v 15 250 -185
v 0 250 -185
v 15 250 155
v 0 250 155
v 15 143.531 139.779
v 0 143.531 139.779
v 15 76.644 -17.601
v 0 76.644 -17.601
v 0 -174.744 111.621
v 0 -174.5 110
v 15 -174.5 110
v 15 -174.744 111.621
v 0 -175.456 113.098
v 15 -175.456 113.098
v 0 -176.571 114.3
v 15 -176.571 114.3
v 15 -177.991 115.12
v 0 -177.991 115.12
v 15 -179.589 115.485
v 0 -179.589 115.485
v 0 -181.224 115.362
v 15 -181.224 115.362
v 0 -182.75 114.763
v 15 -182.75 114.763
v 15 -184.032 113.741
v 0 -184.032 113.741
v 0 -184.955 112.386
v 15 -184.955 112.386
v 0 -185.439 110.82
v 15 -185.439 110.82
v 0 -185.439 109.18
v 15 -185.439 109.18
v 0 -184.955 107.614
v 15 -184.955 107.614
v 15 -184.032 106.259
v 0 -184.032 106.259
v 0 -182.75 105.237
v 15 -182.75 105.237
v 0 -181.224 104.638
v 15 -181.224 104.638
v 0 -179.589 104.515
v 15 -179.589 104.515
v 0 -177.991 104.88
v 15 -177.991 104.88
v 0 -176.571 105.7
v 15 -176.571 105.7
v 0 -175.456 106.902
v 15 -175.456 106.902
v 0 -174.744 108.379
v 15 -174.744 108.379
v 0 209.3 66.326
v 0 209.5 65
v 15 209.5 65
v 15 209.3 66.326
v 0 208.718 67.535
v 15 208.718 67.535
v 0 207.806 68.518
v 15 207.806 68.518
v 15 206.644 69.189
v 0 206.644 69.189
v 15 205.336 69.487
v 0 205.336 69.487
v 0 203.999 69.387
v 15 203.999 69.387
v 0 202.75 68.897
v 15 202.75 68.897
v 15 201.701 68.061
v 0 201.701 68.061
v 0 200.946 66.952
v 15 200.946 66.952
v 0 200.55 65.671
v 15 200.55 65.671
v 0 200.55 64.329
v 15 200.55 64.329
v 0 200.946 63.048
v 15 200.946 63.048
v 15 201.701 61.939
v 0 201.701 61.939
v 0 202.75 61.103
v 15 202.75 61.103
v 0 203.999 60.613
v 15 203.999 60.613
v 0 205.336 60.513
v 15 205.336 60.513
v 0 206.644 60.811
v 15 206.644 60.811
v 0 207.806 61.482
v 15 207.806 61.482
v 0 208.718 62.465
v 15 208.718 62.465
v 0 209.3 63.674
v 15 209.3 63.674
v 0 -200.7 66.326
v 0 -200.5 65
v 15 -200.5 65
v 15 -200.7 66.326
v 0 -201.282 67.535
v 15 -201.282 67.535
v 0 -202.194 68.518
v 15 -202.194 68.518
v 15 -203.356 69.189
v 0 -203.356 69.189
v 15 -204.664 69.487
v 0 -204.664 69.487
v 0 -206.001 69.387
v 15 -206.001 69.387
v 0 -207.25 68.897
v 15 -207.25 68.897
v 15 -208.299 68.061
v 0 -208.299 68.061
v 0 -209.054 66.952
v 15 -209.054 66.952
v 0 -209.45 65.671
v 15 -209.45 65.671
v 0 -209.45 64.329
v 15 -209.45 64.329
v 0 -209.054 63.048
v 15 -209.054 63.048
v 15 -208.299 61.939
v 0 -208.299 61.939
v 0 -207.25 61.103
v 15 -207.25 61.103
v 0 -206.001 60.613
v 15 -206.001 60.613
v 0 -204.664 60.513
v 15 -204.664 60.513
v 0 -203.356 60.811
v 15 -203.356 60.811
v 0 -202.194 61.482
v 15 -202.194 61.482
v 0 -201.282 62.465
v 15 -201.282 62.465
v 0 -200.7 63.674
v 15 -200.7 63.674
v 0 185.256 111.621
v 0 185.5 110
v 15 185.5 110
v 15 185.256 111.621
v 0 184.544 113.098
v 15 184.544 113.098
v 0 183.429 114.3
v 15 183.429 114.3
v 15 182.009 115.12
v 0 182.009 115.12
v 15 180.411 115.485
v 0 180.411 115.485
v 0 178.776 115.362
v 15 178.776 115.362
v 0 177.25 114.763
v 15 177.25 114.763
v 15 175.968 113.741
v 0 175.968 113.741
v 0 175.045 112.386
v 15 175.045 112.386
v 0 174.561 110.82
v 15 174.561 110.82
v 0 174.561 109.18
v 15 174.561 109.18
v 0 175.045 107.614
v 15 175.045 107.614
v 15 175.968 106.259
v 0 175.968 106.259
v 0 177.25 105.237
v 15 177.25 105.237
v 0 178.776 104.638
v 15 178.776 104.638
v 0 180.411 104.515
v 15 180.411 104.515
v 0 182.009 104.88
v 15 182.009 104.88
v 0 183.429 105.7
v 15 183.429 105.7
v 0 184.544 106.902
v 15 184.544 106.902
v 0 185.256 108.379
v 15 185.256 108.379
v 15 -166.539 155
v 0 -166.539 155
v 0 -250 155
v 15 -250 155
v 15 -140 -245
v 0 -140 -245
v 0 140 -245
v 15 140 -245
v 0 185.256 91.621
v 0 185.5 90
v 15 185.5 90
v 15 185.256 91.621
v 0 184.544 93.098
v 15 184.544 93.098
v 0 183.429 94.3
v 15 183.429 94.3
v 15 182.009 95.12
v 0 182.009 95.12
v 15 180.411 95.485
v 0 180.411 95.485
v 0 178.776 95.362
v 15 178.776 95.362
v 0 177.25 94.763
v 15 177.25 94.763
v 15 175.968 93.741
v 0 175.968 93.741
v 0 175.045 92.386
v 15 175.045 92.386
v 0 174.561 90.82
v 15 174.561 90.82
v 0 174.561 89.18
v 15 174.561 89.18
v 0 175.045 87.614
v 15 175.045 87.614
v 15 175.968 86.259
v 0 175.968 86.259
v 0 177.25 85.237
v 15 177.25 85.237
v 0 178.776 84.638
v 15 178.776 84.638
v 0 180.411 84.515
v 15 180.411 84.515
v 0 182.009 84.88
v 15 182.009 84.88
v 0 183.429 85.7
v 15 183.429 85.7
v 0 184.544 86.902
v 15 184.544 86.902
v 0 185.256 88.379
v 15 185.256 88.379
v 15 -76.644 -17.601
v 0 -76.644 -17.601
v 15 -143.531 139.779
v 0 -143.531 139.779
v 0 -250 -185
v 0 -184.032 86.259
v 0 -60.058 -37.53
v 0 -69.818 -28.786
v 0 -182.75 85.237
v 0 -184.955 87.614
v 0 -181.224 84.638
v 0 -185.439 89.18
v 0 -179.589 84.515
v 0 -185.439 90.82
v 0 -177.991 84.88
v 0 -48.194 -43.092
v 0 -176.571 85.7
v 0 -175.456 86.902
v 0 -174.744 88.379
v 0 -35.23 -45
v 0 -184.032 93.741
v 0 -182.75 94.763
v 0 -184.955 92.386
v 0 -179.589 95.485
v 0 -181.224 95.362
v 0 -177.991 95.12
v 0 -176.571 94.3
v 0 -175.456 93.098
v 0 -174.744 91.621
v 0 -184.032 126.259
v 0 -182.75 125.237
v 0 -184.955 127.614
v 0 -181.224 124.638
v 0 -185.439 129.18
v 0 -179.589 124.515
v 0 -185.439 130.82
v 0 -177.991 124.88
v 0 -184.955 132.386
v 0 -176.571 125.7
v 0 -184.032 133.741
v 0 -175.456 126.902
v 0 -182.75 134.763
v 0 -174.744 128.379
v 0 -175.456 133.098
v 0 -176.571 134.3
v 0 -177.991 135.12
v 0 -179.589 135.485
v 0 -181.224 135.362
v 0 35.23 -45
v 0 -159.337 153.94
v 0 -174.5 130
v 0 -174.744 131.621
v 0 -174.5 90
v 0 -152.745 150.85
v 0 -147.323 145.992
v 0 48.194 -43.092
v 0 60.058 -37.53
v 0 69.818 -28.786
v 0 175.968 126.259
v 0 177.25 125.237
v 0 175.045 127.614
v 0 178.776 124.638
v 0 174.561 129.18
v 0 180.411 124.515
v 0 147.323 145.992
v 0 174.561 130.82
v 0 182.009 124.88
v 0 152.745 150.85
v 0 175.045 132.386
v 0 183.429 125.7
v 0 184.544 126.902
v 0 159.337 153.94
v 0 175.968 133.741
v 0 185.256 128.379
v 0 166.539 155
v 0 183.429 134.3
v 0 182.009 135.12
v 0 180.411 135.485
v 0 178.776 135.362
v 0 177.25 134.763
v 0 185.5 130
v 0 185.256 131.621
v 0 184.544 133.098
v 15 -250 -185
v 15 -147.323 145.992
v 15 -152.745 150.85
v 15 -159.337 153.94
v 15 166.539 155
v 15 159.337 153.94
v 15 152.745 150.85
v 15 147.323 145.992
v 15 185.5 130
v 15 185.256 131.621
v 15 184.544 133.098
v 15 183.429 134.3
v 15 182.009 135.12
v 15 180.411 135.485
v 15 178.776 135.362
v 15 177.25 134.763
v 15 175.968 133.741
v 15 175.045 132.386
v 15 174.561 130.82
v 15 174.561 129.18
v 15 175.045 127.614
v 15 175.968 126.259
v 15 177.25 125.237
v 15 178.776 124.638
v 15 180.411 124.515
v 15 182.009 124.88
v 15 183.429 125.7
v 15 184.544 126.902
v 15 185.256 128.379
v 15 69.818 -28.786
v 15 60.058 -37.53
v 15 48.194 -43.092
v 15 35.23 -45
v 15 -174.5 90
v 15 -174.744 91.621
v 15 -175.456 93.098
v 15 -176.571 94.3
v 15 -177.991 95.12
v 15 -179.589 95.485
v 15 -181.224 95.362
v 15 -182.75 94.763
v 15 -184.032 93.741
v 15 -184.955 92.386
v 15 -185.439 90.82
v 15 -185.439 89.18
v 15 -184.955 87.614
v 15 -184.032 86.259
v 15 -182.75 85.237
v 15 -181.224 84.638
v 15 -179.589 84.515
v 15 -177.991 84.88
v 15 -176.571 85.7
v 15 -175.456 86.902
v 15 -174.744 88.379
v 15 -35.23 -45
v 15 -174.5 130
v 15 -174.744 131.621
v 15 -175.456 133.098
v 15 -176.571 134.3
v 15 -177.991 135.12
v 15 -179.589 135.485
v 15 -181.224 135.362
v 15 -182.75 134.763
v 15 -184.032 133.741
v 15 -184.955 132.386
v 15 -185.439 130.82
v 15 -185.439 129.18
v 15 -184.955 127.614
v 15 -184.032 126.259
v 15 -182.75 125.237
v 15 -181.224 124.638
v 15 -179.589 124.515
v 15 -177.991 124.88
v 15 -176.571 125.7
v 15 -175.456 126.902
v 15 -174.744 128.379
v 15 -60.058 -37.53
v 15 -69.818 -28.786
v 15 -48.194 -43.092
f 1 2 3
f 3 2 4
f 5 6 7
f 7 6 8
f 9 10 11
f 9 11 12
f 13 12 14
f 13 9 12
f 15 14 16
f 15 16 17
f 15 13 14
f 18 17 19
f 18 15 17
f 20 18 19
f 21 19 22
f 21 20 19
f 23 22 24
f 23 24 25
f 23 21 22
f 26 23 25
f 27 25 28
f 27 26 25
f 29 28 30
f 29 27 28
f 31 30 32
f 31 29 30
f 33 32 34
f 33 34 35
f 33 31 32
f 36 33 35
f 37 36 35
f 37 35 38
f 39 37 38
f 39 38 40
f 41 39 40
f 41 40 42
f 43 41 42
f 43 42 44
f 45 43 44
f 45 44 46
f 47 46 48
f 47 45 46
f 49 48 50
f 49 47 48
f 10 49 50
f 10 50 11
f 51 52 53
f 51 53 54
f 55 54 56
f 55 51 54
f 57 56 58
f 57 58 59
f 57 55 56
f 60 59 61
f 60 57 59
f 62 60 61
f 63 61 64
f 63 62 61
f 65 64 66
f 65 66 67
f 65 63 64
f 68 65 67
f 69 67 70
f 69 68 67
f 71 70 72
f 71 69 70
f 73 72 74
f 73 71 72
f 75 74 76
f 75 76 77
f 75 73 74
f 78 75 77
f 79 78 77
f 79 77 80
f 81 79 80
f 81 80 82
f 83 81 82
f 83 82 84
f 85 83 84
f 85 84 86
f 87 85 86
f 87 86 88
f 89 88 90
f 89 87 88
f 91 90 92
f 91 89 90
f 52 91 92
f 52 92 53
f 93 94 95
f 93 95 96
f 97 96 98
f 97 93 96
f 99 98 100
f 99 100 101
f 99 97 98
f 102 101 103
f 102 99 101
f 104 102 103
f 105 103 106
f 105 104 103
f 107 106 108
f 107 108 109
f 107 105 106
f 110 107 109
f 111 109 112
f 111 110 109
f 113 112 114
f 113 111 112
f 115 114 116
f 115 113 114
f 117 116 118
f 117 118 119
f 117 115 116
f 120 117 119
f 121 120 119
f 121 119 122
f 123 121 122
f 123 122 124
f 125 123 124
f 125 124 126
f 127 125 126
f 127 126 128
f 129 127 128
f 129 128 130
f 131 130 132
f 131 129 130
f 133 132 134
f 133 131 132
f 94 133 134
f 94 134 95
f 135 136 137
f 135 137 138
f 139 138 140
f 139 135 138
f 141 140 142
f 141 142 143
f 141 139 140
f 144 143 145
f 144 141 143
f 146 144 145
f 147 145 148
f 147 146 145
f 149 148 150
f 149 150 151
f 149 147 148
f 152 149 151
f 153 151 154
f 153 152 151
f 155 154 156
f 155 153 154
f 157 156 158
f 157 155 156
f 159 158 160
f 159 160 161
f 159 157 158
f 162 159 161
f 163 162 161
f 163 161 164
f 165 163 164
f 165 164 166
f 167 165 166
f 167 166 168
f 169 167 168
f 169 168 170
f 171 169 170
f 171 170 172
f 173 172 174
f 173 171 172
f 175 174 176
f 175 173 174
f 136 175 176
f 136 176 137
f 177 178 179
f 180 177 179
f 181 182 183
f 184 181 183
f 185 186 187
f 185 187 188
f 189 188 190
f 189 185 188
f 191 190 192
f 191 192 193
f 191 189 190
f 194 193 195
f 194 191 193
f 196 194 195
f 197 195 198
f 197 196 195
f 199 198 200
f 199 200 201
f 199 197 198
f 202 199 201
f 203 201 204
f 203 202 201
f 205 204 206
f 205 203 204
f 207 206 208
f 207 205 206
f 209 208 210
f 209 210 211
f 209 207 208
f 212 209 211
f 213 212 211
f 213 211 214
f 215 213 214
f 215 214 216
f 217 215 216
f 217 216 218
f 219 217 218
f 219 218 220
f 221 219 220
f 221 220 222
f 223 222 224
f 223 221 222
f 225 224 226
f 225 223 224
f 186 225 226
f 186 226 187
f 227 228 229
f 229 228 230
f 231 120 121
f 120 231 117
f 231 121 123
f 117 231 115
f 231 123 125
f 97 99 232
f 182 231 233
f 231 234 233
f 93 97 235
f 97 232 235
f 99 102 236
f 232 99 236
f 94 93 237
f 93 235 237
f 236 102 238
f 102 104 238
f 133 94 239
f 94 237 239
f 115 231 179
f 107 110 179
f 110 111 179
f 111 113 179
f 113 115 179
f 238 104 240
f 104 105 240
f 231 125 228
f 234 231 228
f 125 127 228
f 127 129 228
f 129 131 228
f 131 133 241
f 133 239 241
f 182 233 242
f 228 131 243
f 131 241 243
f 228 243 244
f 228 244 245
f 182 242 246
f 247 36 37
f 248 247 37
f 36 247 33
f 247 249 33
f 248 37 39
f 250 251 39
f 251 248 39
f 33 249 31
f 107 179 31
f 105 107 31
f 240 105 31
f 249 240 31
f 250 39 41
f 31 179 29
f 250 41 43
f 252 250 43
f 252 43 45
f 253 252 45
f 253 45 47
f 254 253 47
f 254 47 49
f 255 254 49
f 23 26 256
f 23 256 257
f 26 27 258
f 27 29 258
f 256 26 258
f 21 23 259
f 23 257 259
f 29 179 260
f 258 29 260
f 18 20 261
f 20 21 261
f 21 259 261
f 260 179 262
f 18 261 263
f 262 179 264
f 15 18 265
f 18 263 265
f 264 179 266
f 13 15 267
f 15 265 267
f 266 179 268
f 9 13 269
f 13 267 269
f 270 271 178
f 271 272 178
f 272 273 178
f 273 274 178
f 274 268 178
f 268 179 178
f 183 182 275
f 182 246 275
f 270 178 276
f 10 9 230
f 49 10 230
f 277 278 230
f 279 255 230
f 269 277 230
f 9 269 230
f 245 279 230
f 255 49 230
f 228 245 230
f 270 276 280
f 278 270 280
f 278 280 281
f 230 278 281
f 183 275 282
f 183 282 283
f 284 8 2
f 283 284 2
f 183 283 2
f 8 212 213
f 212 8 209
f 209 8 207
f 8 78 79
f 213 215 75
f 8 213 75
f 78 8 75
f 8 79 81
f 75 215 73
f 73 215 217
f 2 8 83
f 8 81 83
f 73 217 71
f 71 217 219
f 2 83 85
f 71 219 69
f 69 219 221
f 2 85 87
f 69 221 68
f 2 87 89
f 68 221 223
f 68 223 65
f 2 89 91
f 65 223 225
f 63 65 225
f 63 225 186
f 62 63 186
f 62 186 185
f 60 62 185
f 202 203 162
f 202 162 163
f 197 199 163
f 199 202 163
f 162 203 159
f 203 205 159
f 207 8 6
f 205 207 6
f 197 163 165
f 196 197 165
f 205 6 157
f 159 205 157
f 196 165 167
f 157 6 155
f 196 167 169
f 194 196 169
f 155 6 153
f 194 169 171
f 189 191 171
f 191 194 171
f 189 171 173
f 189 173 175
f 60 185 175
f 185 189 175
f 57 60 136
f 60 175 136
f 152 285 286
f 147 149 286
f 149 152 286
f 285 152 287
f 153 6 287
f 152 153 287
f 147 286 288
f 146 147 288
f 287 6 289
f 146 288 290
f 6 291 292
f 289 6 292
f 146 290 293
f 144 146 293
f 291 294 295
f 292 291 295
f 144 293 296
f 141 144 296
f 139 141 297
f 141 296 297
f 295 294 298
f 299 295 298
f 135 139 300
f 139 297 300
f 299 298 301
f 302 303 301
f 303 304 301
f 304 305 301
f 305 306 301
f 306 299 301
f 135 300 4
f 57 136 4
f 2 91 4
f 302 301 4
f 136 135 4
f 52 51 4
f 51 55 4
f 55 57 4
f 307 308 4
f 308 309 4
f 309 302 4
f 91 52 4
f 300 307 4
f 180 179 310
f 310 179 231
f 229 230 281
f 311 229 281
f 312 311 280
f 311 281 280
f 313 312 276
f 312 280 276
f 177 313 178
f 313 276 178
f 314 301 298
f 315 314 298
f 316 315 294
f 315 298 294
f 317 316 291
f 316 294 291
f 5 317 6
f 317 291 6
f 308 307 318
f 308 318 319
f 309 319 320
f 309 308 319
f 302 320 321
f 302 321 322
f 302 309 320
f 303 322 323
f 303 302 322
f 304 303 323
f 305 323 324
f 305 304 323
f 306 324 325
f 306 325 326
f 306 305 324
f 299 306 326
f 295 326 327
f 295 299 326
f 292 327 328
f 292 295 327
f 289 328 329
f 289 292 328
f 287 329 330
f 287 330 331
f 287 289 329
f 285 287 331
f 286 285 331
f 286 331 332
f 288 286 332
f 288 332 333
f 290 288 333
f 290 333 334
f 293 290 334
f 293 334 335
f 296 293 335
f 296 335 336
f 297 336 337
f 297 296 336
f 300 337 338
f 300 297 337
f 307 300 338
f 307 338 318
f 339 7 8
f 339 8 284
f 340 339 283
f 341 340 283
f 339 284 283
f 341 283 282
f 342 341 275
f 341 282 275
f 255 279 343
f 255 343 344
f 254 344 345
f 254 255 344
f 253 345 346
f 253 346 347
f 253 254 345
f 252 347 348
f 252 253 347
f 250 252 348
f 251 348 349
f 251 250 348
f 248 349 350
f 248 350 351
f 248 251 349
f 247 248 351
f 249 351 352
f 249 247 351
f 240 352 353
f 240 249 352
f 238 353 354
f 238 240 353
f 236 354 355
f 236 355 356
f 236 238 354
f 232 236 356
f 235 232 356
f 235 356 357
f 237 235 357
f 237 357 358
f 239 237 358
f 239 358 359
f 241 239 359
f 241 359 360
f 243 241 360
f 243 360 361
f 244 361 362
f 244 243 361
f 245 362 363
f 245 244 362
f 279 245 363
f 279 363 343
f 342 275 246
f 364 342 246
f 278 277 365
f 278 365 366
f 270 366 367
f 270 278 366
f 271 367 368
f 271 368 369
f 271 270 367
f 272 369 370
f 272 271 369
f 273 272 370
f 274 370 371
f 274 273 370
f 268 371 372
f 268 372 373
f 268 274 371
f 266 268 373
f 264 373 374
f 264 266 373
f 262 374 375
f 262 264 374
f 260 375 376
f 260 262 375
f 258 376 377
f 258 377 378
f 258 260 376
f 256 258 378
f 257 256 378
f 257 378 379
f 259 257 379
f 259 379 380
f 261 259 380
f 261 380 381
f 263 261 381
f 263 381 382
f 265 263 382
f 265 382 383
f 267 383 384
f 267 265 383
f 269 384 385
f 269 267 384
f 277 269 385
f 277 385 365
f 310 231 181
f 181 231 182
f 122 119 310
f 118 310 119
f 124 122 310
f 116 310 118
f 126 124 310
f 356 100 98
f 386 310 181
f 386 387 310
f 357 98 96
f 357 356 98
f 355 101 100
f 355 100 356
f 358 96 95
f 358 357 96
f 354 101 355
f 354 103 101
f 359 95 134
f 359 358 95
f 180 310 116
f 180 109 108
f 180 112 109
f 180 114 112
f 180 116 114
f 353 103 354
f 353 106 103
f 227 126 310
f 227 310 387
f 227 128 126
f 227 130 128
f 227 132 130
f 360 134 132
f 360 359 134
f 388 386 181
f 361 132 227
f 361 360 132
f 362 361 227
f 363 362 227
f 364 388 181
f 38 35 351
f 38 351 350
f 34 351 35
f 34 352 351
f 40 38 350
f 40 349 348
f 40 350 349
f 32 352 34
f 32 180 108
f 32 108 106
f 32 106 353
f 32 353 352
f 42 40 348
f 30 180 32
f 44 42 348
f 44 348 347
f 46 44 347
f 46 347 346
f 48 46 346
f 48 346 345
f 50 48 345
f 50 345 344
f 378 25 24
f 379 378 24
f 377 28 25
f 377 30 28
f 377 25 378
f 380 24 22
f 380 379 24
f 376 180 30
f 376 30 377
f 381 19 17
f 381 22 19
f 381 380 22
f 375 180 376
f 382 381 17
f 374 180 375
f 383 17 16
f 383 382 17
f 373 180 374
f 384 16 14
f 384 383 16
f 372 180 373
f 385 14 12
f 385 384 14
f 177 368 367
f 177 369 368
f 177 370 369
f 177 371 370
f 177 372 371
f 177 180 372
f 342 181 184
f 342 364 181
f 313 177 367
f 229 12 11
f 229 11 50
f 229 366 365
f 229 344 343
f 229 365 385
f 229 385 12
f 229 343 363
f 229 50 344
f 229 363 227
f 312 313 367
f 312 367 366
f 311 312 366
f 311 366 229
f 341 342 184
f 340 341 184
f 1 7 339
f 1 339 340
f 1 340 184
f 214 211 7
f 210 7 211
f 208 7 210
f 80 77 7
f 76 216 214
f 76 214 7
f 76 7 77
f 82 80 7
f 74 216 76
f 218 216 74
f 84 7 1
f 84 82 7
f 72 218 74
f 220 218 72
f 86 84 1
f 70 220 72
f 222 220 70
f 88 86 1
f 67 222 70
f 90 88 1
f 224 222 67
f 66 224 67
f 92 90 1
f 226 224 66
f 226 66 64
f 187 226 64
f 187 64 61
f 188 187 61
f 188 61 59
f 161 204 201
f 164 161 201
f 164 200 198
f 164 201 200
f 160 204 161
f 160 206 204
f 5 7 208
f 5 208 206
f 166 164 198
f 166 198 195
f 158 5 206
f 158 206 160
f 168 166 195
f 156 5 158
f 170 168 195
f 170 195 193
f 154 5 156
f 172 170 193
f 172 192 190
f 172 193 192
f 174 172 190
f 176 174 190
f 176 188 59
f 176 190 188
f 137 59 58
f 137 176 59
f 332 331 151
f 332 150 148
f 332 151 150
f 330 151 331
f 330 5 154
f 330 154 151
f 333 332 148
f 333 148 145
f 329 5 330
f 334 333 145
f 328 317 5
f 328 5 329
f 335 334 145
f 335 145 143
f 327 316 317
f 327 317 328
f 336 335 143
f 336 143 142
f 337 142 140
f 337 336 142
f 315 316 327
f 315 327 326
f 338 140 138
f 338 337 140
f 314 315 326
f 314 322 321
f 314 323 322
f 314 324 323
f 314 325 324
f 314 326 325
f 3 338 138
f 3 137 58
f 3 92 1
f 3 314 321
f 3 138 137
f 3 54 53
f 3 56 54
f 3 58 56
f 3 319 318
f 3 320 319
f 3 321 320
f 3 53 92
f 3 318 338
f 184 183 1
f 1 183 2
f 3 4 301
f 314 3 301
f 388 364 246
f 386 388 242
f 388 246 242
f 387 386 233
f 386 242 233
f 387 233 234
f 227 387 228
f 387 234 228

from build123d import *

# Parameters (mm, degrees)
F0_R     = 4.5
F0_R_2   = 5.5
F1_DEPTH = 15


with BuildPart() as f1:
    # F0 (on Right) → F1 (new body)
    with BuildSketch(Plane.YZ):
        with BuildLine():
            Line((-166.539142, 155), (-250, 155))
            Line((-250, 155), (-250, -185))
            Line((-250, -185), (-140, -245))
            Line((-140, -245), (0, -245))
            Line((0, -245), (140, -245))
            Line((140, -245), (250, -185))
            Line((250, -185), (250, 155))
            Line((250, 155), (166.539142, 155))
            ThreePointArc((166.539142, 155), (152.745356, 150.850215), (143.530869, 139.778516))
            Line((143.530869, 139.778516), (76.644435, -17.601329))
            ThreePointArc((76.644435, -17.601329), (60.05836, -37.530386), (35.229544, -45))
            Line((35.229544, -45), (0, -45))
            Line((0, -45), (-35.229544, -45))
            ThreePointArc((-35.229544, -45), (-60.05836, -37.530386), (-76.644435, -17.601329))
            Line((-76.644435, -17.601329), (-143.530869, 139.778516))
            ThreePointArc((-143.530869, 139.778516), (-152.745356, 150.850215), (-166.539142, 155))
        make_face()
        with Locations((-205, 65)):
            Circle(F0_R, mode=Mode.SUBTRACT)
        with Locations((-180, 90)):
            Circle(F0_R_2, mode=Mode.SUBTRACT)
        with Locations((-180, 110)):
            Circle(F0_R_2, mode=Mode.SUBTRACT)
        with Locations((-180, 130)):
            Circle(F0_R_2, mode=Mode.SUBTRACT)
        with Locations((180, 90)):
            Circle(F0_R_2, mode=Mode.SUBTRACT)
        with Locations((205, 65)):
            Circle(F0_R, mode=Mode.SUBTRACT)
        with Locations((180, 110)):
            Circle(F0_R_2, mode=Mode.SUBTRACT)
        with Locations((180, 130)):
            Circle(F0_R_2, mode=Mode.SUBTRACT)
    extrude(amount=F1_DEPTH)


solid = f1.part
